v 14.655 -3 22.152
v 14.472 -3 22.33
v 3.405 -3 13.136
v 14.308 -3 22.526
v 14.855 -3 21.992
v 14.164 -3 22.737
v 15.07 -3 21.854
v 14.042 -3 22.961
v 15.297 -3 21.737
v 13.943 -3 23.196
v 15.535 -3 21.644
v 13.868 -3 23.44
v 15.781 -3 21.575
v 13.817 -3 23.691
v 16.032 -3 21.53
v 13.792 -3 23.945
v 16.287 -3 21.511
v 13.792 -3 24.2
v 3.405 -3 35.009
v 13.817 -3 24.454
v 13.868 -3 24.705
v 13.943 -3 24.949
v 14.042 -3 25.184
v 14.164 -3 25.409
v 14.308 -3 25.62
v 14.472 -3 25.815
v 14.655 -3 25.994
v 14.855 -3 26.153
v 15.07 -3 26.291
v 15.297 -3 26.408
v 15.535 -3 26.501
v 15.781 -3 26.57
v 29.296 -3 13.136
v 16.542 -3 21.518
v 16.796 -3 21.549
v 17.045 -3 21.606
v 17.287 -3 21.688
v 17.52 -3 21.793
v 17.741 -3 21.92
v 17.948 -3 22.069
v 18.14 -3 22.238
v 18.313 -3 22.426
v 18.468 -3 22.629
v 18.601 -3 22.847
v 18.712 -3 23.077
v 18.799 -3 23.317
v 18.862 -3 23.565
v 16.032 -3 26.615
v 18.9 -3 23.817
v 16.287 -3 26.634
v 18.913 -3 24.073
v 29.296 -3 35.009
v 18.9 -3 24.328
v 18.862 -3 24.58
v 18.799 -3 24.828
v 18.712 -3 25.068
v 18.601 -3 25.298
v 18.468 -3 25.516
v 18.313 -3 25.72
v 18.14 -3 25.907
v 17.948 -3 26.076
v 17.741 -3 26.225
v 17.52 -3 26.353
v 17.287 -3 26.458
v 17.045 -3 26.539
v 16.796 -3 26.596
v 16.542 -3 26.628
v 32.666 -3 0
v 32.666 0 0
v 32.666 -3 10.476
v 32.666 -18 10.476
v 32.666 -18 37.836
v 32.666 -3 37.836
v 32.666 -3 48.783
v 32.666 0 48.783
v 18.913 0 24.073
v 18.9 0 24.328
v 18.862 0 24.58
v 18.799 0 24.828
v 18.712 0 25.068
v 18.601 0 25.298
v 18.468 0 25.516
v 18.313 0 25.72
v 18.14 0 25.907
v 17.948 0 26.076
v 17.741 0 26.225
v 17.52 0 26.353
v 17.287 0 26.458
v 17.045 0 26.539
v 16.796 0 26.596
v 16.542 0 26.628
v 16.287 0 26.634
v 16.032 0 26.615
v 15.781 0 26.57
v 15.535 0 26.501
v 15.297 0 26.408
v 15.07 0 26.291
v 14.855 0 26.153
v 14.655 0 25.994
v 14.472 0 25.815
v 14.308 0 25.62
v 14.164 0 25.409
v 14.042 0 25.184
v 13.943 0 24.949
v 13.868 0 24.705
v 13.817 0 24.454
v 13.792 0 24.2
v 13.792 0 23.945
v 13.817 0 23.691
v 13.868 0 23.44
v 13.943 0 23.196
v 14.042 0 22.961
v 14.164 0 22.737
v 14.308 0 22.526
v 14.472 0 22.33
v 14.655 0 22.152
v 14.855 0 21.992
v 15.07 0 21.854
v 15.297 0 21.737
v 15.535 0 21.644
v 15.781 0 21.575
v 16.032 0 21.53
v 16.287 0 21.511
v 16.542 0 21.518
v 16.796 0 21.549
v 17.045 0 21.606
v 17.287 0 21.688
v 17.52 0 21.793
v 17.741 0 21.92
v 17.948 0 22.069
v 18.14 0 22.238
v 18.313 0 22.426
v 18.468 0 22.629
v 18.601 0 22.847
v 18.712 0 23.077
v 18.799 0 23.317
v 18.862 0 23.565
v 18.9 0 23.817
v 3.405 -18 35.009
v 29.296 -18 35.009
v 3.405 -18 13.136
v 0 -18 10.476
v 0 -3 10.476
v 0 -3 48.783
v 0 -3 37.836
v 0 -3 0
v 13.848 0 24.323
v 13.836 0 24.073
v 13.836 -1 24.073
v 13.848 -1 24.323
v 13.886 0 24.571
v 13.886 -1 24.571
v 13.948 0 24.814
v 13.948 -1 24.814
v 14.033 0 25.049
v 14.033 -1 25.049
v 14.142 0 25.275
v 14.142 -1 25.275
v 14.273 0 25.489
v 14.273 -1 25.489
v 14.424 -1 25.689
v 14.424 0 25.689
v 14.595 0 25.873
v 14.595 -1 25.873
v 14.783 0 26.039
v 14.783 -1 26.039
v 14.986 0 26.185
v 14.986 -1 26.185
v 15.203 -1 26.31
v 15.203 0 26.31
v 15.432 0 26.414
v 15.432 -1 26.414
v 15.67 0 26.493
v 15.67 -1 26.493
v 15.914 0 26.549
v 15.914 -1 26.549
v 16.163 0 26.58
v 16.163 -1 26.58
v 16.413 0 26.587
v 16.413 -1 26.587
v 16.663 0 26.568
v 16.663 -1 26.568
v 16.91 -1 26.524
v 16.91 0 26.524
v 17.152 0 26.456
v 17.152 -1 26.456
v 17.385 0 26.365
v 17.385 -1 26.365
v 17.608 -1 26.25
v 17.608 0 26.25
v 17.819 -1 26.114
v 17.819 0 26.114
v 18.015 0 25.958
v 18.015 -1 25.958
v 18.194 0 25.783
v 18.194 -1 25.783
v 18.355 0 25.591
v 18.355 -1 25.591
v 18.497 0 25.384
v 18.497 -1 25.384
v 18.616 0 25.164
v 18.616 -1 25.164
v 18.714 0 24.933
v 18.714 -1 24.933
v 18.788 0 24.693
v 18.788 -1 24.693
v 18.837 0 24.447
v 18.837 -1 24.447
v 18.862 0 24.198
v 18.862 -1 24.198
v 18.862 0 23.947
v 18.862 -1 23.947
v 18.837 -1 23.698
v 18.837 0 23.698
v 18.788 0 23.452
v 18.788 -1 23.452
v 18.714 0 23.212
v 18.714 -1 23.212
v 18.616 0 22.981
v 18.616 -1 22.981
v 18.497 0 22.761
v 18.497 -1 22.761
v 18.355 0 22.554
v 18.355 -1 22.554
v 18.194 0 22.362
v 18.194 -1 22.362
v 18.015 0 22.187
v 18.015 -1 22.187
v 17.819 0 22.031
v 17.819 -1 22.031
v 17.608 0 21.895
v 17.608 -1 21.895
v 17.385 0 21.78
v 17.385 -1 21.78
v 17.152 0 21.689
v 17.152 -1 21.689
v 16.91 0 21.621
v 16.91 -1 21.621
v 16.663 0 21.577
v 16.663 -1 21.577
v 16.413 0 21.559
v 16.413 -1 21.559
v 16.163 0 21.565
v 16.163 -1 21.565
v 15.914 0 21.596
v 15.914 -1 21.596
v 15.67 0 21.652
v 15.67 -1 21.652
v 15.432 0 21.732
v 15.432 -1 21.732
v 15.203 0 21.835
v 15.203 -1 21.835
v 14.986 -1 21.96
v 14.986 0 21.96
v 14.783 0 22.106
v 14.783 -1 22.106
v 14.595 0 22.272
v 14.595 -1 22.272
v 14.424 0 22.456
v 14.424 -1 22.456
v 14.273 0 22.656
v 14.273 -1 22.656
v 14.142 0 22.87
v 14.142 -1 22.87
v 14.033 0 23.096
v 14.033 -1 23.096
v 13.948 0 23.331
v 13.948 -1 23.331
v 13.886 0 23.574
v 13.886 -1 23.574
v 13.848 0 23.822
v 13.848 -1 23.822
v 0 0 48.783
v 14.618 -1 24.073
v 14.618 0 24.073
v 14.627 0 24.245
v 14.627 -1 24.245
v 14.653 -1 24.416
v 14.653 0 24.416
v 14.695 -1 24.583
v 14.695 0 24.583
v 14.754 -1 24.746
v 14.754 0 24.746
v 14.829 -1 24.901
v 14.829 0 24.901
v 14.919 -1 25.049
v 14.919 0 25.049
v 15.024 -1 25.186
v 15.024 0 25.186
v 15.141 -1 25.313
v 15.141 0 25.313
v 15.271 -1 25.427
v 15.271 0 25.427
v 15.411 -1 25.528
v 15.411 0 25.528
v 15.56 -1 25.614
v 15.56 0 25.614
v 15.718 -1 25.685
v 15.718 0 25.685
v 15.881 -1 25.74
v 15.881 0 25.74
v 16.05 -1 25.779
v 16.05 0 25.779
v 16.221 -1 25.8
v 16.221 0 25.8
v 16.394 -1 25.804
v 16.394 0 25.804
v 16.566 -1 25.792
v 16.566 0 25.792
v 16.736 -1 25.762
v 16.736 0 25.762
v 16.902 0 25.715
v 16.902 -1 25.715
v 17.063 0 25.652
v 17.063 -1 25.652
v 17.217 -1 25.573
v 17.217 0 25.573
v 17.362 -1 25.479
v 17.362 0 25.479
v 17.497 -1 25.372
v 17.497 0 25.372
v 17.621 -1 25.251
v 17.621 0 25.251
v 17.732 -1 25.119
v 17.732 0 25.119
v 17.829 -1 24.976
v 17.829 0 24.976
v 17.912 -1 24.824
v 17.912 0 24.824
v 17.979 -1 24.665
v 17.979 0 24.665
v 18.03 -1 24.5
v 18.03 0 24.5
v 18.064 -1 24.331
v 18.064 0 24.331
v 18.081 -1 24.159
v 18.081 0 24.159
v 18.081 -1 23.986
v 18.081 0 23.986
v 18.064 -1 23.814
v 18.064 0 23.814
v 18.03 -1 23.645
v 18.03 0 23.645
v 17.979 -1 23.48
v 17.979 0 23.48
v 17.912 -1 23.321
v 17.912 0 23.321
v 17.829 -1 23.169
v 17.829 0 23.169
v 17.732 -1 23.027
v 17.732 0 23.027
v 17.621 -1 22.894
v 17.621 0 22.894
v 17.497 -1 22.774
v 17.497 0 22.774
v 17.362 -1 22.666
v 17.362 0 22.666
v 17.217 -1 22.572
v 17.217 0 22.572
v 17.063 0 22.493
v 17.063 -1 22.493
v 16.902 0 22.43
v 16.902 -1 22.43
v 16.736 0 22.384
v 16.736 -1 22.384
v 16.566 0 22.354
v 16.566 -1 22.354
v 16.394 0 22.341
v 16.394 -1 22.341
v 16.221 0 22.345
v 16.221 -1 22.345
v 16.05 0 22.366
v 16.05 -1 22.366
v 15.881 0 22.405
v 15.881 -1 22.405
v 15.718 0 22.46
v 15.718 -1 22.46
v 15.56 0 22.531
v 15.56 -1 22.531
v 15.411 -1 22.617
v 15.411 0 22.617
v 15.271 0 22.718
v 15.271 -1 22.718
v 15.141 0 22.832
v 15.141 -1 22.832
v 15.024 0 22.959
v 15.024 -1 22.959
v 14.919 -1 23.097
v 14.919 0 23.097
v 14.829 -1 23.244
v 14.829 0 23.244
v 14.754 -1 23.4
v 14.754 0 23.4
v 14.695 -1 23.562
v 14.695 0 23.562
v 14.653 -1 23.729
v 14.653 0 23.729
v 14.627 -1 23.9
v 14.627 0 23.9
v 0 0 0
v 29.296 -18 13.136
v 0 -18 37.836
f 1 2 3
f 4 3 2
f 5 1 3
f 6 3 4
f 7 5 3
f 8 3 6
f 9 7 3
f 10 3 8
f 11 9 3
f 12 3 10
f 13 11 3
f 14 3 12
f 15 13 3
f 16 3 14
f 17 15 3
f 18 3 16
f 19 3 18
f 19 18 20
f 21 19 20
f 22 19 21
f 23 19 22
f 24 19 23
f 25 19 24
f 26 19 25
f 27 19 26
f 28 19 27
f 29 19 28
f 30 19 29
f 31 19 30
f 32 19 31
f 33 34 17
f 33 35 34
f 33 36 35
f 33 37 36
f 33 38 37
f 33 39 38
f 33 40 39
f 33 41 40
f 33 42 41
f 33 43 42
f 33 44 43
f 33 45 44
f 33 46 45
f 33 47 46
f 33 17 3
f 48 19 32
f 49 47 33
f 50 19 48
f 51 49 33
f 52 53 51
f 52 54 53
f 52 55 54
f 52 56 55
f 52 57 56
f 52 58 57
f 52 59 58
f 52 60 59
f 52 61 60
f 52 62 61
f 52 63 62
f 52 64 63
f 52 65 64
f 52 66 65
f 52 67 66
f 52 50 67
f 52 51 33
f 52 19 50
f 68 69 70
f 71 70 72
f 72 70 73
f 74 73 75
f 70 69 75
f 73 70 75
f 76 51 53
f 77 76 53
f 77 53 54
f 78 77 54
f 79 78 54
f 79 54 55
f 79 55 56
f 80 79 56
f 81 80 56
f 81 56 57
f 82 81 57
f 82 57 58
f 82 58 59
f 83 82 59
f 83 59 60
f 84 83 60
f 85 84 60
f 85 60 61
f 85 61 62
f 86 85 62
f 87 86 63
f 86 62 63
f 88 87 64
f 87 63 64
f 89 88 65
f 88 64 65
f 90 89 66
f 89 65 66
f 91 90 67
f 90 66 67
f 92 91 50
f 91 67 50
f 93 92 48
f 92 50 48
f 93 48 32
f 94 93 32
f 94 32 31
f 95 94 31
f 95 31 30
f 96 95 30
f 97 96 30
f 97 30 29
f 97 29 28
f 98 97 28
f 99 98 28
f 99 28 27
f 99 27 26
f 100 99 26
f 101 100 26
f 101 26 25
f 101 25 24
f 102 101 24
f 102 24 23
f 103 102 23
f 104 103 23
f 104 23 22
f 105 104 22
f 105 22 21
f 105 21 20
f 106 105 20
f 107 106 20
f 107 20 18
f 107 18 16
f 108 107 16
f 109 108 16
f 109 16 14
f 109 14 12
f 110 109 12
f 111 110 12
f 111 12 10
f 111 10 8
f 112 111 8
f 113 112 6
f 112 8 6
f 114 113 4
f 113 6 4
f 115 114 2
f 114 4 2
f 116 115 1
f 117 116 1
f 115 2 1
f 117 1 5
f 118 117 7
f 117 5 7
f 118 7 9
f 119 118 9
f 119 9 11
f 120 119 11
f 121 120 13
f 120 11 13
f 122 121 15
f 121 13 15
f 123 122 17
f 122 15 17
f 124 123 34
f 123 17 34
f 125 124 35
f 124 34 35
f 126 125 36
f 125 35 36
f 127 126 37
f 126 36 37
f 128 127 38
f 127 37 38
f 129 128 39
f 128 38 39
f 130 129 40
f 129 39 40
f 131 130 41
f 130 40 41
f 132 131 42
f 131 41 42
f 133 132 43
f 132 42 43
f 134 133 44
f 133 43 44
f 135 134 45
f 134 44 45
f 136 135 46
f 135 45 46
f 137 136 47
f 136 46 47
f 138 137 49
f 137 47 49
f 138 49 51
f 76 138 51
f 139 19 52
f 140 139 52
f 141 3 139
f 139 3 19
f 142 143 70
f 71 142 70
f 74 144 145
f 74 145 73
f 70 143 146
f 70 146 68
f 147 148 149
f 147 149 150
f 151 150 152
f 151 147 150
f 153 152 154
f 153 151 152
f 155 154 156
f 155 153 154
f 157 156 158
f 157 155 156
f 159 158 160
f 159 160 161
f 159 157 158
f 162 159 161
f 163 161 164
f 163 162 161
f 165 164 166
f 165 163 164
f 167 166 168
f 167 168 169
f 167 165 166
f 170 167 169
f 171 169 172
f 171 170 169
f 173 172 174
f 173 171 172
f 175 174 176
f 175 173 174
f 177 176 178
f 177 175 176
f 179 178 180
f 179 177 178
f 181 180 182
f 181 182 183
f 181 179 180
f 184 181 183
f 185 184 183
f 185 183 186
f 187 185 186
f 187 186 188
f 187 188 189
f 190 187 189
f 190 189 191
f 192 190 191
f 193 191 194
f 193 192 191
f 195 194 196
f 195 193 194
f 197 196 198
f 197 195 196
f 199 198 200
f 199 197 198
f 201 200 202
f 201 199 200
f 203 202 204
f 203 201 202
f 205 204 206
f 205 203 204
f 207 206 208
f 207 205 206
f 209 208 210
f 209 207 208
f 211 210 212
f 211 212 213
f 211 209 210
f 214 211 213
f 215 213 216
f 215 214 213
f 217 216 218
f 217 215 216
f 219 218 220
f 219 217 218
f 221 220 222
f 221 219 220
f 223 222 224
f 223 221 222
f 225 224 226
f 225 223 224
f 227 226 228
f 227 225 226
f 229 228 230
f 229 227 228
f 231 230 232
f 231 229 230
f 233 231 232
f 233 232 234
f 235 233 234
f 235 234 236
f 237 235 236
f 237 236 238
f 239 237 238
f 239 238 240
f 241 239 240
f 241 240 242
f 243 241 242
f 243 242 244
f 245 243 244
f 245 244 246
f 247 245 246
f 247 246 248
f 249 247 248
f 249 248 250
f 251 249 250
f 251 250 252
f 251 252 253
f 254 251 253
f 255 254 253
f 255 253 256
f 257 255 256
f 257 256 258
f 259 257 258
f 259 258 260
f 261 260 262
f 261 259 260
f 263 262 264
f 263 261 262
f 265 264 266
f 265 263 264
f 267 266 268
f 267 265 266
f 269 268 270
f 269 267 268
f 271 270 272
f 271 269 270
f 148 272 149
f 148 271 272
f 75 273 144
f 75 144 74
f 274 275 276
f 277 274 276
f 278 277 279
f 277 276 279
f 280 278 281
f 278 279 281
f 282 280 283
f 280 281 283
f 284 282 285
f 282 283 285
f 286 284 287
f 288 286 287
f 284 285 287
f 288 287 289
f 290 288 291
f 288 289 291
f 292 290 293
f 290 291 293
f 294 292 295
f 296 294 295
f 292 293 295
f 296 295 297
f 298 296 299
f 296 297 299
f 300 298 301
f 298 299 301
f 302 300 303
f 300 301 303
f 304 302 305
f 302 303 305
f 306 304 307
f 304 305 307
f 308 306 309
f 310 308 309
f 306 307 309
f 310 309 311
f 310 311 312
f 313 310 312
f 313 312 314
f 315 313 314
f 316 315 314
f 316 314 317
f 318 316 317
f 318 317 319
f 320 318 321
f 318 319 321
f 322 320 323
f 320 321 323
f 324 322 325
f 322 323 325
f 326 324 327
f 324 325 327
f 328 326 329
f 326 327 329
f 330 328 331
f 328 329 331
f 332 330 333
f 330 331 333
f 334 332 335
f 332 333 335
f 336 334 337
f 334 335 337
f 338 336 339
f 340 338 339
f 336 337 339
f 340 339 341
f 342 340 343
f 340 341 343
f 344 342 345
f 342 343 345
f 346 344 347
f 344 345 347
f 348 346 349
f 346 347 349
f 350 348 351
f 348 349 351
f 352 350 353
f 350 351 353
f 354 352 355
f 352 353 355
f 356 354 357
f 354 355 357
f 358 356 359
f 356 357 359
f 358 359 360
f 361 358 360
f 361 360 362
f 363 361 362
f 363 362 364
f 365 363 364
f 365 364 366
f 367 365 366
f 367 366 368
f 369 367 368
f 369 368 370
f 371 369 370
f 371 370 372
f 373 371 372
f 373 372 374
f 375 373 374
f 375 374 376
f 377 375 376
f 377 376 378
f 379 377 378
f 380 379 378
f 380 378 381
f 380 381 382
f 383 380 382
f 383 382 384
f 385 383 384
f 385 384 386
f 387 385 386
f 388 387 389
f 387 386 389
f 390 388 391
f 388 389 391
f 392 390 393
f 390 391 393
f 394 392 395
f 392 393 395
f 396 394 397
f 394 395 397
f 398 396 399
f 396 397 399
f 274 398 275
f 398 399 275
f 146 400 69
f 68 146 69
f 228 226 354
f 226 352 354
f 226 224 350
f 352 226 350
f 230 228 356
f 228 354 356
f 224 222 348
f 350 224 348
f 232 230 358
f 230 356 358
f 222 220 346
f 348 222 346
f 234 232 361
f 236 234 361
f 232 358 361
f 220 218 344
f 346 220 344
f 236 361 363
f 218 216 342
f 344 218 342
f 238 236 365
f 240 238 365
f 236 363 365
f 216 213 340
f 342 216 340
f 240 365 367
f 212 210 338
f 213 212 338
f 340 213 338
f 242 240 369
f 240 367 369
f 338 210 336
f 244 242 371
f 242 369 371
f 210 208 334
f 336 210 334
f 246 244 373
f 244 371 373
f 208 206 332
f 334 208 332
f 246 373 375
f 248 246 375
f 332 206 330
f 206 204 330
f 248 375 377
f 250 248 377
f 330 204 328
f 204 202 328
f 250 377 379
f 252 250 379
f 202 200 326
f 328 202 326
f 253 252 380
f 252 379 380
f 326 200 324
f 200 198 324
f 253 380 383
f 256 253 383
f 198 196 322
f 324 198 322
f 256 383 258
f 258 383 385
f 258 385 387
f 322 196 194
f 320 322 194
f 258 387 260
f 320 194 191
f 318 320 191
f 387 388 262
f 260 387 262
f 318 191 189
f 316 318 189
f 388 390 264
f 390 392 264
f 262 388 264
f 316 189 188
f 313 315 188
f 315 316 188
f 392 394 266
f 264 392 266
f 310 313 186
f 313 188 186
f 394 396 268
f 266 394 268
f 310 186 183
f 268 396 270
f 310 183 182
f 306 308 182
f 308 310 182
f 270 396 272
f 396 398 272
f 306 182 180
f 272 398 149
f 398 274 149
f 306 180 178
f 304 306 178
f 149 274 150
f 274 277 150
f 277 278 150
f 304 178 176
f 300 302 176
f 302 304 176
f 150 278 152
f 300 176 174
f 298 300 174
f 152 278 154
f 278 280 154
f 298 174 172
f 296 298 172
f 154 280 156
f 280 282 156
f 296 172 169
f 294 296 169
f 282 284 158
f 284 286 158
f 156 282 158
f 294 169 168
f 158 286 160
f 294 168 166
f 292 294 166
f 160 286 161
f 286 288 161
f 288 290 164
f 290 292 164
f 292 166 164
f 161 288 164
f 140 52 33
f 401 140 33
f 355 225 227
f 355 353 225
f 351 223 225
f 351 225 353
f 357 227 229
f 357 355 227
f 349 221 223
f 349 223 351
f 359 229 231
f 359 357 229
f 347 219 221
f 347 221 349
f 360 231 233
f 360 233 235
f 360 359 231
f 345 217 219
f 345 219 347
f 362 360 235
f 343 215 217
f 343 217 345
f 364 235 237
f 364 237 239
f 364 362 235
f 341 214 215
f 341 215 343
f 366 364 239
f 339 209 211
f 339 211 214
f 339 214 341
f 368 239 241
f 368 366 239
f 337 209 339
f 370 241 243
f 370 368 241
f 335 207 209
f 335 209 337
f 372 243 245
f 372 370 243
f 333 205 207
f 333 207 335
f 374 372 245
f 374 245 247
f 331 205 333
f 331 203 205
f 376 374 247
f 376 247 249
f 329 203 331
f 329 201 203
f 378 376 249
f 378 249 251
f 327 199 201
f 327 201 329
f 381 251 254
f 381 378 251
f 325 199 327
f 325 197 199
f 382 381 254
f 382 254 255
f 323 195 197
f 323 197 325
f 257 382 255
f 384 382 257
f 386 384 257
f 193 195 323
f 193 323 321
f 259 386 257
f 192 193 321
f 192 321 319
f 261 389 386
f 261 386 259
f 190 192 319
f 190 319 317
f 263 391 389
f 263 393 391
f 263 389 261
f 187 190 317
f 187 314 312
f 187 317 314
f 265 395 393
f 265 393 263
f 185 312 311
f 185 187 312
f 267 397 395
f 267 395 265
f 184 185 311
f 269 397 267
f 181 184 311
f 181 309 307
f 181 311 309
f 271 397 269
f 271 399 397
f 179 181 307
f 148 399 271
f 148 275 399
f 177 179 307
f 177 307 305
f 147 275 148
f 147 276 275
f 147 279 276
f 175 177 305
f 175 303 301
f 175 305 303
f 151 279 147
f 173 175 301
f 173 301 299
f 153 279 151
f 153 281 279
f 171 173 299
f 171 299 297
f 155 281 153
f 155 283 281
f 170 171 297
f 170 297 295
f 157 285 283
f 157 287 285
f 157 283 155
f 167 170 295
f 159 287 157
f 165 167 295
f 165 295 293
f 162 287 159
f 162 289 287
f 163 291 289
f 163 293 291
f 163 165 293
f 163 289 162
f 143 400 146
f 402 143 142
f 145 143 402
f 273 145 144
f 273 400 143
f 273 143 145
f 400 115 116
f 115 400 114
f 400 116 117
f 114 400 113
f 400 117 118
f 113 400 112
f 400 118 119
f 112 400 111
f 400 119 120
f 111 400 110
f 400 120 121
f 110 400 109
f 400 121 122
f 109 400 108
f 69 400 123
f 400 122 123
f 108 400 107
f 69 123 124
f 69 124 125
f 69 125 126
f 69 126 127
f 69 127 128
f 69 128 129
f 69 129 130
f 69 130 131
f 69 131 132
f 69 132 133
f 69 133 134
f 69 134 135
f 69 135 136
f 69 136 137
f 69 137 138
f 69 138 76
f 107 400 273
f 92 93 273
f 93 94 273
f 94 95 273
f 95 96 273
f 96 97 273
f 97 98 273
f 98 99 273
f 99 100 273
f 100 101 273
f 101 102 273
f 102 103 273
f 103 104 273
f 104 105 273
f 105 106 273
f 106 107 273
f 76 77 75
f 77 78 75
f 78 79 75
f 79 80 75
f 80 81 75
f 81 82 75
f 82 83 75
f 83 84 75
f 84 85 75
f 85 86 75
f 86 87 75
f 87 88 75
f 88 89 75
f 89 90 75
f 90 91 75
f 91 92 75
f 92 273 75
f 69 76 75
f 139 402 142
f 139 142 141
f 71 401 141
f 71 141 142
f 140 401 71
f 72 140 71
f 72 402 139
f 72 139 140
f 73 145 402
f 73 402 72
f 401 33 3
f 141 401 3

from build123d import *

# Parameters (mm, degrees)
F0_W     = 32.665957
F0_H     = 48.783079
F1_DEPTH = 3
F2_W     = 32.665957
F2_H     = 27.359366
F3_DEPTH = 15
F4_R     = 2.562135
F5_DEPTH = 25
F6_R     = 2.514789
F6_R_2   = 1.732431
F7_DEPTH = 1


with BuildPart() as f1:
    # F0 (on Front) → F1 (new body)
    with BuildSketch(Plane.XZ):
        with Locations((16.332978, 24.39154)):
            Rectangle(F0_W, F0_H)
    extrude(amount=F1_DEPTH)

    # F2 (on face) → F3 (join)
    with BuildSketch(Plane.XZ.offset(3)):
        with Locations((16.332978, 24.155848)):
            Rectangle(F2_W, F2_H)
        Polygon((3.404888, 35.008952), (16.332978, 35.008952), (29.296422, 35.008952), (29.296422, 13.136239), (3.404888, 13.136239), align=None, mode=Mode.SUBTRACT)
    extrude(amount=F3_DEPTH)

    # F4 (on face) → F5 (cut)
    with BuildSketch(Plane.XZ.offset(3)):
        with Locations((16.350655, 24.072595)):
            Circle(F4_R)
    extrude(amount=-F5_DEPTH, mode=Mode.SUBTRACT)


with BuildPart() as f7:
    # F6 (on face) → F7 (new body)
    with BuildSketch(Plane(origin=(0, 0, 0), x_dir=(-1, 0, 0), z_dir=(0, 1, 0))):
        with Locations((-16.350655, 24.072595)):
            Circle(F6_R)
        with Locations((-16.350655, 24.072595)):
            Circle(F6_R_2, mode=Mode.SUBTRACT)
    extrude(amount=-F7_DEPTH)


solid = Compound([f1.part, f7.part])
